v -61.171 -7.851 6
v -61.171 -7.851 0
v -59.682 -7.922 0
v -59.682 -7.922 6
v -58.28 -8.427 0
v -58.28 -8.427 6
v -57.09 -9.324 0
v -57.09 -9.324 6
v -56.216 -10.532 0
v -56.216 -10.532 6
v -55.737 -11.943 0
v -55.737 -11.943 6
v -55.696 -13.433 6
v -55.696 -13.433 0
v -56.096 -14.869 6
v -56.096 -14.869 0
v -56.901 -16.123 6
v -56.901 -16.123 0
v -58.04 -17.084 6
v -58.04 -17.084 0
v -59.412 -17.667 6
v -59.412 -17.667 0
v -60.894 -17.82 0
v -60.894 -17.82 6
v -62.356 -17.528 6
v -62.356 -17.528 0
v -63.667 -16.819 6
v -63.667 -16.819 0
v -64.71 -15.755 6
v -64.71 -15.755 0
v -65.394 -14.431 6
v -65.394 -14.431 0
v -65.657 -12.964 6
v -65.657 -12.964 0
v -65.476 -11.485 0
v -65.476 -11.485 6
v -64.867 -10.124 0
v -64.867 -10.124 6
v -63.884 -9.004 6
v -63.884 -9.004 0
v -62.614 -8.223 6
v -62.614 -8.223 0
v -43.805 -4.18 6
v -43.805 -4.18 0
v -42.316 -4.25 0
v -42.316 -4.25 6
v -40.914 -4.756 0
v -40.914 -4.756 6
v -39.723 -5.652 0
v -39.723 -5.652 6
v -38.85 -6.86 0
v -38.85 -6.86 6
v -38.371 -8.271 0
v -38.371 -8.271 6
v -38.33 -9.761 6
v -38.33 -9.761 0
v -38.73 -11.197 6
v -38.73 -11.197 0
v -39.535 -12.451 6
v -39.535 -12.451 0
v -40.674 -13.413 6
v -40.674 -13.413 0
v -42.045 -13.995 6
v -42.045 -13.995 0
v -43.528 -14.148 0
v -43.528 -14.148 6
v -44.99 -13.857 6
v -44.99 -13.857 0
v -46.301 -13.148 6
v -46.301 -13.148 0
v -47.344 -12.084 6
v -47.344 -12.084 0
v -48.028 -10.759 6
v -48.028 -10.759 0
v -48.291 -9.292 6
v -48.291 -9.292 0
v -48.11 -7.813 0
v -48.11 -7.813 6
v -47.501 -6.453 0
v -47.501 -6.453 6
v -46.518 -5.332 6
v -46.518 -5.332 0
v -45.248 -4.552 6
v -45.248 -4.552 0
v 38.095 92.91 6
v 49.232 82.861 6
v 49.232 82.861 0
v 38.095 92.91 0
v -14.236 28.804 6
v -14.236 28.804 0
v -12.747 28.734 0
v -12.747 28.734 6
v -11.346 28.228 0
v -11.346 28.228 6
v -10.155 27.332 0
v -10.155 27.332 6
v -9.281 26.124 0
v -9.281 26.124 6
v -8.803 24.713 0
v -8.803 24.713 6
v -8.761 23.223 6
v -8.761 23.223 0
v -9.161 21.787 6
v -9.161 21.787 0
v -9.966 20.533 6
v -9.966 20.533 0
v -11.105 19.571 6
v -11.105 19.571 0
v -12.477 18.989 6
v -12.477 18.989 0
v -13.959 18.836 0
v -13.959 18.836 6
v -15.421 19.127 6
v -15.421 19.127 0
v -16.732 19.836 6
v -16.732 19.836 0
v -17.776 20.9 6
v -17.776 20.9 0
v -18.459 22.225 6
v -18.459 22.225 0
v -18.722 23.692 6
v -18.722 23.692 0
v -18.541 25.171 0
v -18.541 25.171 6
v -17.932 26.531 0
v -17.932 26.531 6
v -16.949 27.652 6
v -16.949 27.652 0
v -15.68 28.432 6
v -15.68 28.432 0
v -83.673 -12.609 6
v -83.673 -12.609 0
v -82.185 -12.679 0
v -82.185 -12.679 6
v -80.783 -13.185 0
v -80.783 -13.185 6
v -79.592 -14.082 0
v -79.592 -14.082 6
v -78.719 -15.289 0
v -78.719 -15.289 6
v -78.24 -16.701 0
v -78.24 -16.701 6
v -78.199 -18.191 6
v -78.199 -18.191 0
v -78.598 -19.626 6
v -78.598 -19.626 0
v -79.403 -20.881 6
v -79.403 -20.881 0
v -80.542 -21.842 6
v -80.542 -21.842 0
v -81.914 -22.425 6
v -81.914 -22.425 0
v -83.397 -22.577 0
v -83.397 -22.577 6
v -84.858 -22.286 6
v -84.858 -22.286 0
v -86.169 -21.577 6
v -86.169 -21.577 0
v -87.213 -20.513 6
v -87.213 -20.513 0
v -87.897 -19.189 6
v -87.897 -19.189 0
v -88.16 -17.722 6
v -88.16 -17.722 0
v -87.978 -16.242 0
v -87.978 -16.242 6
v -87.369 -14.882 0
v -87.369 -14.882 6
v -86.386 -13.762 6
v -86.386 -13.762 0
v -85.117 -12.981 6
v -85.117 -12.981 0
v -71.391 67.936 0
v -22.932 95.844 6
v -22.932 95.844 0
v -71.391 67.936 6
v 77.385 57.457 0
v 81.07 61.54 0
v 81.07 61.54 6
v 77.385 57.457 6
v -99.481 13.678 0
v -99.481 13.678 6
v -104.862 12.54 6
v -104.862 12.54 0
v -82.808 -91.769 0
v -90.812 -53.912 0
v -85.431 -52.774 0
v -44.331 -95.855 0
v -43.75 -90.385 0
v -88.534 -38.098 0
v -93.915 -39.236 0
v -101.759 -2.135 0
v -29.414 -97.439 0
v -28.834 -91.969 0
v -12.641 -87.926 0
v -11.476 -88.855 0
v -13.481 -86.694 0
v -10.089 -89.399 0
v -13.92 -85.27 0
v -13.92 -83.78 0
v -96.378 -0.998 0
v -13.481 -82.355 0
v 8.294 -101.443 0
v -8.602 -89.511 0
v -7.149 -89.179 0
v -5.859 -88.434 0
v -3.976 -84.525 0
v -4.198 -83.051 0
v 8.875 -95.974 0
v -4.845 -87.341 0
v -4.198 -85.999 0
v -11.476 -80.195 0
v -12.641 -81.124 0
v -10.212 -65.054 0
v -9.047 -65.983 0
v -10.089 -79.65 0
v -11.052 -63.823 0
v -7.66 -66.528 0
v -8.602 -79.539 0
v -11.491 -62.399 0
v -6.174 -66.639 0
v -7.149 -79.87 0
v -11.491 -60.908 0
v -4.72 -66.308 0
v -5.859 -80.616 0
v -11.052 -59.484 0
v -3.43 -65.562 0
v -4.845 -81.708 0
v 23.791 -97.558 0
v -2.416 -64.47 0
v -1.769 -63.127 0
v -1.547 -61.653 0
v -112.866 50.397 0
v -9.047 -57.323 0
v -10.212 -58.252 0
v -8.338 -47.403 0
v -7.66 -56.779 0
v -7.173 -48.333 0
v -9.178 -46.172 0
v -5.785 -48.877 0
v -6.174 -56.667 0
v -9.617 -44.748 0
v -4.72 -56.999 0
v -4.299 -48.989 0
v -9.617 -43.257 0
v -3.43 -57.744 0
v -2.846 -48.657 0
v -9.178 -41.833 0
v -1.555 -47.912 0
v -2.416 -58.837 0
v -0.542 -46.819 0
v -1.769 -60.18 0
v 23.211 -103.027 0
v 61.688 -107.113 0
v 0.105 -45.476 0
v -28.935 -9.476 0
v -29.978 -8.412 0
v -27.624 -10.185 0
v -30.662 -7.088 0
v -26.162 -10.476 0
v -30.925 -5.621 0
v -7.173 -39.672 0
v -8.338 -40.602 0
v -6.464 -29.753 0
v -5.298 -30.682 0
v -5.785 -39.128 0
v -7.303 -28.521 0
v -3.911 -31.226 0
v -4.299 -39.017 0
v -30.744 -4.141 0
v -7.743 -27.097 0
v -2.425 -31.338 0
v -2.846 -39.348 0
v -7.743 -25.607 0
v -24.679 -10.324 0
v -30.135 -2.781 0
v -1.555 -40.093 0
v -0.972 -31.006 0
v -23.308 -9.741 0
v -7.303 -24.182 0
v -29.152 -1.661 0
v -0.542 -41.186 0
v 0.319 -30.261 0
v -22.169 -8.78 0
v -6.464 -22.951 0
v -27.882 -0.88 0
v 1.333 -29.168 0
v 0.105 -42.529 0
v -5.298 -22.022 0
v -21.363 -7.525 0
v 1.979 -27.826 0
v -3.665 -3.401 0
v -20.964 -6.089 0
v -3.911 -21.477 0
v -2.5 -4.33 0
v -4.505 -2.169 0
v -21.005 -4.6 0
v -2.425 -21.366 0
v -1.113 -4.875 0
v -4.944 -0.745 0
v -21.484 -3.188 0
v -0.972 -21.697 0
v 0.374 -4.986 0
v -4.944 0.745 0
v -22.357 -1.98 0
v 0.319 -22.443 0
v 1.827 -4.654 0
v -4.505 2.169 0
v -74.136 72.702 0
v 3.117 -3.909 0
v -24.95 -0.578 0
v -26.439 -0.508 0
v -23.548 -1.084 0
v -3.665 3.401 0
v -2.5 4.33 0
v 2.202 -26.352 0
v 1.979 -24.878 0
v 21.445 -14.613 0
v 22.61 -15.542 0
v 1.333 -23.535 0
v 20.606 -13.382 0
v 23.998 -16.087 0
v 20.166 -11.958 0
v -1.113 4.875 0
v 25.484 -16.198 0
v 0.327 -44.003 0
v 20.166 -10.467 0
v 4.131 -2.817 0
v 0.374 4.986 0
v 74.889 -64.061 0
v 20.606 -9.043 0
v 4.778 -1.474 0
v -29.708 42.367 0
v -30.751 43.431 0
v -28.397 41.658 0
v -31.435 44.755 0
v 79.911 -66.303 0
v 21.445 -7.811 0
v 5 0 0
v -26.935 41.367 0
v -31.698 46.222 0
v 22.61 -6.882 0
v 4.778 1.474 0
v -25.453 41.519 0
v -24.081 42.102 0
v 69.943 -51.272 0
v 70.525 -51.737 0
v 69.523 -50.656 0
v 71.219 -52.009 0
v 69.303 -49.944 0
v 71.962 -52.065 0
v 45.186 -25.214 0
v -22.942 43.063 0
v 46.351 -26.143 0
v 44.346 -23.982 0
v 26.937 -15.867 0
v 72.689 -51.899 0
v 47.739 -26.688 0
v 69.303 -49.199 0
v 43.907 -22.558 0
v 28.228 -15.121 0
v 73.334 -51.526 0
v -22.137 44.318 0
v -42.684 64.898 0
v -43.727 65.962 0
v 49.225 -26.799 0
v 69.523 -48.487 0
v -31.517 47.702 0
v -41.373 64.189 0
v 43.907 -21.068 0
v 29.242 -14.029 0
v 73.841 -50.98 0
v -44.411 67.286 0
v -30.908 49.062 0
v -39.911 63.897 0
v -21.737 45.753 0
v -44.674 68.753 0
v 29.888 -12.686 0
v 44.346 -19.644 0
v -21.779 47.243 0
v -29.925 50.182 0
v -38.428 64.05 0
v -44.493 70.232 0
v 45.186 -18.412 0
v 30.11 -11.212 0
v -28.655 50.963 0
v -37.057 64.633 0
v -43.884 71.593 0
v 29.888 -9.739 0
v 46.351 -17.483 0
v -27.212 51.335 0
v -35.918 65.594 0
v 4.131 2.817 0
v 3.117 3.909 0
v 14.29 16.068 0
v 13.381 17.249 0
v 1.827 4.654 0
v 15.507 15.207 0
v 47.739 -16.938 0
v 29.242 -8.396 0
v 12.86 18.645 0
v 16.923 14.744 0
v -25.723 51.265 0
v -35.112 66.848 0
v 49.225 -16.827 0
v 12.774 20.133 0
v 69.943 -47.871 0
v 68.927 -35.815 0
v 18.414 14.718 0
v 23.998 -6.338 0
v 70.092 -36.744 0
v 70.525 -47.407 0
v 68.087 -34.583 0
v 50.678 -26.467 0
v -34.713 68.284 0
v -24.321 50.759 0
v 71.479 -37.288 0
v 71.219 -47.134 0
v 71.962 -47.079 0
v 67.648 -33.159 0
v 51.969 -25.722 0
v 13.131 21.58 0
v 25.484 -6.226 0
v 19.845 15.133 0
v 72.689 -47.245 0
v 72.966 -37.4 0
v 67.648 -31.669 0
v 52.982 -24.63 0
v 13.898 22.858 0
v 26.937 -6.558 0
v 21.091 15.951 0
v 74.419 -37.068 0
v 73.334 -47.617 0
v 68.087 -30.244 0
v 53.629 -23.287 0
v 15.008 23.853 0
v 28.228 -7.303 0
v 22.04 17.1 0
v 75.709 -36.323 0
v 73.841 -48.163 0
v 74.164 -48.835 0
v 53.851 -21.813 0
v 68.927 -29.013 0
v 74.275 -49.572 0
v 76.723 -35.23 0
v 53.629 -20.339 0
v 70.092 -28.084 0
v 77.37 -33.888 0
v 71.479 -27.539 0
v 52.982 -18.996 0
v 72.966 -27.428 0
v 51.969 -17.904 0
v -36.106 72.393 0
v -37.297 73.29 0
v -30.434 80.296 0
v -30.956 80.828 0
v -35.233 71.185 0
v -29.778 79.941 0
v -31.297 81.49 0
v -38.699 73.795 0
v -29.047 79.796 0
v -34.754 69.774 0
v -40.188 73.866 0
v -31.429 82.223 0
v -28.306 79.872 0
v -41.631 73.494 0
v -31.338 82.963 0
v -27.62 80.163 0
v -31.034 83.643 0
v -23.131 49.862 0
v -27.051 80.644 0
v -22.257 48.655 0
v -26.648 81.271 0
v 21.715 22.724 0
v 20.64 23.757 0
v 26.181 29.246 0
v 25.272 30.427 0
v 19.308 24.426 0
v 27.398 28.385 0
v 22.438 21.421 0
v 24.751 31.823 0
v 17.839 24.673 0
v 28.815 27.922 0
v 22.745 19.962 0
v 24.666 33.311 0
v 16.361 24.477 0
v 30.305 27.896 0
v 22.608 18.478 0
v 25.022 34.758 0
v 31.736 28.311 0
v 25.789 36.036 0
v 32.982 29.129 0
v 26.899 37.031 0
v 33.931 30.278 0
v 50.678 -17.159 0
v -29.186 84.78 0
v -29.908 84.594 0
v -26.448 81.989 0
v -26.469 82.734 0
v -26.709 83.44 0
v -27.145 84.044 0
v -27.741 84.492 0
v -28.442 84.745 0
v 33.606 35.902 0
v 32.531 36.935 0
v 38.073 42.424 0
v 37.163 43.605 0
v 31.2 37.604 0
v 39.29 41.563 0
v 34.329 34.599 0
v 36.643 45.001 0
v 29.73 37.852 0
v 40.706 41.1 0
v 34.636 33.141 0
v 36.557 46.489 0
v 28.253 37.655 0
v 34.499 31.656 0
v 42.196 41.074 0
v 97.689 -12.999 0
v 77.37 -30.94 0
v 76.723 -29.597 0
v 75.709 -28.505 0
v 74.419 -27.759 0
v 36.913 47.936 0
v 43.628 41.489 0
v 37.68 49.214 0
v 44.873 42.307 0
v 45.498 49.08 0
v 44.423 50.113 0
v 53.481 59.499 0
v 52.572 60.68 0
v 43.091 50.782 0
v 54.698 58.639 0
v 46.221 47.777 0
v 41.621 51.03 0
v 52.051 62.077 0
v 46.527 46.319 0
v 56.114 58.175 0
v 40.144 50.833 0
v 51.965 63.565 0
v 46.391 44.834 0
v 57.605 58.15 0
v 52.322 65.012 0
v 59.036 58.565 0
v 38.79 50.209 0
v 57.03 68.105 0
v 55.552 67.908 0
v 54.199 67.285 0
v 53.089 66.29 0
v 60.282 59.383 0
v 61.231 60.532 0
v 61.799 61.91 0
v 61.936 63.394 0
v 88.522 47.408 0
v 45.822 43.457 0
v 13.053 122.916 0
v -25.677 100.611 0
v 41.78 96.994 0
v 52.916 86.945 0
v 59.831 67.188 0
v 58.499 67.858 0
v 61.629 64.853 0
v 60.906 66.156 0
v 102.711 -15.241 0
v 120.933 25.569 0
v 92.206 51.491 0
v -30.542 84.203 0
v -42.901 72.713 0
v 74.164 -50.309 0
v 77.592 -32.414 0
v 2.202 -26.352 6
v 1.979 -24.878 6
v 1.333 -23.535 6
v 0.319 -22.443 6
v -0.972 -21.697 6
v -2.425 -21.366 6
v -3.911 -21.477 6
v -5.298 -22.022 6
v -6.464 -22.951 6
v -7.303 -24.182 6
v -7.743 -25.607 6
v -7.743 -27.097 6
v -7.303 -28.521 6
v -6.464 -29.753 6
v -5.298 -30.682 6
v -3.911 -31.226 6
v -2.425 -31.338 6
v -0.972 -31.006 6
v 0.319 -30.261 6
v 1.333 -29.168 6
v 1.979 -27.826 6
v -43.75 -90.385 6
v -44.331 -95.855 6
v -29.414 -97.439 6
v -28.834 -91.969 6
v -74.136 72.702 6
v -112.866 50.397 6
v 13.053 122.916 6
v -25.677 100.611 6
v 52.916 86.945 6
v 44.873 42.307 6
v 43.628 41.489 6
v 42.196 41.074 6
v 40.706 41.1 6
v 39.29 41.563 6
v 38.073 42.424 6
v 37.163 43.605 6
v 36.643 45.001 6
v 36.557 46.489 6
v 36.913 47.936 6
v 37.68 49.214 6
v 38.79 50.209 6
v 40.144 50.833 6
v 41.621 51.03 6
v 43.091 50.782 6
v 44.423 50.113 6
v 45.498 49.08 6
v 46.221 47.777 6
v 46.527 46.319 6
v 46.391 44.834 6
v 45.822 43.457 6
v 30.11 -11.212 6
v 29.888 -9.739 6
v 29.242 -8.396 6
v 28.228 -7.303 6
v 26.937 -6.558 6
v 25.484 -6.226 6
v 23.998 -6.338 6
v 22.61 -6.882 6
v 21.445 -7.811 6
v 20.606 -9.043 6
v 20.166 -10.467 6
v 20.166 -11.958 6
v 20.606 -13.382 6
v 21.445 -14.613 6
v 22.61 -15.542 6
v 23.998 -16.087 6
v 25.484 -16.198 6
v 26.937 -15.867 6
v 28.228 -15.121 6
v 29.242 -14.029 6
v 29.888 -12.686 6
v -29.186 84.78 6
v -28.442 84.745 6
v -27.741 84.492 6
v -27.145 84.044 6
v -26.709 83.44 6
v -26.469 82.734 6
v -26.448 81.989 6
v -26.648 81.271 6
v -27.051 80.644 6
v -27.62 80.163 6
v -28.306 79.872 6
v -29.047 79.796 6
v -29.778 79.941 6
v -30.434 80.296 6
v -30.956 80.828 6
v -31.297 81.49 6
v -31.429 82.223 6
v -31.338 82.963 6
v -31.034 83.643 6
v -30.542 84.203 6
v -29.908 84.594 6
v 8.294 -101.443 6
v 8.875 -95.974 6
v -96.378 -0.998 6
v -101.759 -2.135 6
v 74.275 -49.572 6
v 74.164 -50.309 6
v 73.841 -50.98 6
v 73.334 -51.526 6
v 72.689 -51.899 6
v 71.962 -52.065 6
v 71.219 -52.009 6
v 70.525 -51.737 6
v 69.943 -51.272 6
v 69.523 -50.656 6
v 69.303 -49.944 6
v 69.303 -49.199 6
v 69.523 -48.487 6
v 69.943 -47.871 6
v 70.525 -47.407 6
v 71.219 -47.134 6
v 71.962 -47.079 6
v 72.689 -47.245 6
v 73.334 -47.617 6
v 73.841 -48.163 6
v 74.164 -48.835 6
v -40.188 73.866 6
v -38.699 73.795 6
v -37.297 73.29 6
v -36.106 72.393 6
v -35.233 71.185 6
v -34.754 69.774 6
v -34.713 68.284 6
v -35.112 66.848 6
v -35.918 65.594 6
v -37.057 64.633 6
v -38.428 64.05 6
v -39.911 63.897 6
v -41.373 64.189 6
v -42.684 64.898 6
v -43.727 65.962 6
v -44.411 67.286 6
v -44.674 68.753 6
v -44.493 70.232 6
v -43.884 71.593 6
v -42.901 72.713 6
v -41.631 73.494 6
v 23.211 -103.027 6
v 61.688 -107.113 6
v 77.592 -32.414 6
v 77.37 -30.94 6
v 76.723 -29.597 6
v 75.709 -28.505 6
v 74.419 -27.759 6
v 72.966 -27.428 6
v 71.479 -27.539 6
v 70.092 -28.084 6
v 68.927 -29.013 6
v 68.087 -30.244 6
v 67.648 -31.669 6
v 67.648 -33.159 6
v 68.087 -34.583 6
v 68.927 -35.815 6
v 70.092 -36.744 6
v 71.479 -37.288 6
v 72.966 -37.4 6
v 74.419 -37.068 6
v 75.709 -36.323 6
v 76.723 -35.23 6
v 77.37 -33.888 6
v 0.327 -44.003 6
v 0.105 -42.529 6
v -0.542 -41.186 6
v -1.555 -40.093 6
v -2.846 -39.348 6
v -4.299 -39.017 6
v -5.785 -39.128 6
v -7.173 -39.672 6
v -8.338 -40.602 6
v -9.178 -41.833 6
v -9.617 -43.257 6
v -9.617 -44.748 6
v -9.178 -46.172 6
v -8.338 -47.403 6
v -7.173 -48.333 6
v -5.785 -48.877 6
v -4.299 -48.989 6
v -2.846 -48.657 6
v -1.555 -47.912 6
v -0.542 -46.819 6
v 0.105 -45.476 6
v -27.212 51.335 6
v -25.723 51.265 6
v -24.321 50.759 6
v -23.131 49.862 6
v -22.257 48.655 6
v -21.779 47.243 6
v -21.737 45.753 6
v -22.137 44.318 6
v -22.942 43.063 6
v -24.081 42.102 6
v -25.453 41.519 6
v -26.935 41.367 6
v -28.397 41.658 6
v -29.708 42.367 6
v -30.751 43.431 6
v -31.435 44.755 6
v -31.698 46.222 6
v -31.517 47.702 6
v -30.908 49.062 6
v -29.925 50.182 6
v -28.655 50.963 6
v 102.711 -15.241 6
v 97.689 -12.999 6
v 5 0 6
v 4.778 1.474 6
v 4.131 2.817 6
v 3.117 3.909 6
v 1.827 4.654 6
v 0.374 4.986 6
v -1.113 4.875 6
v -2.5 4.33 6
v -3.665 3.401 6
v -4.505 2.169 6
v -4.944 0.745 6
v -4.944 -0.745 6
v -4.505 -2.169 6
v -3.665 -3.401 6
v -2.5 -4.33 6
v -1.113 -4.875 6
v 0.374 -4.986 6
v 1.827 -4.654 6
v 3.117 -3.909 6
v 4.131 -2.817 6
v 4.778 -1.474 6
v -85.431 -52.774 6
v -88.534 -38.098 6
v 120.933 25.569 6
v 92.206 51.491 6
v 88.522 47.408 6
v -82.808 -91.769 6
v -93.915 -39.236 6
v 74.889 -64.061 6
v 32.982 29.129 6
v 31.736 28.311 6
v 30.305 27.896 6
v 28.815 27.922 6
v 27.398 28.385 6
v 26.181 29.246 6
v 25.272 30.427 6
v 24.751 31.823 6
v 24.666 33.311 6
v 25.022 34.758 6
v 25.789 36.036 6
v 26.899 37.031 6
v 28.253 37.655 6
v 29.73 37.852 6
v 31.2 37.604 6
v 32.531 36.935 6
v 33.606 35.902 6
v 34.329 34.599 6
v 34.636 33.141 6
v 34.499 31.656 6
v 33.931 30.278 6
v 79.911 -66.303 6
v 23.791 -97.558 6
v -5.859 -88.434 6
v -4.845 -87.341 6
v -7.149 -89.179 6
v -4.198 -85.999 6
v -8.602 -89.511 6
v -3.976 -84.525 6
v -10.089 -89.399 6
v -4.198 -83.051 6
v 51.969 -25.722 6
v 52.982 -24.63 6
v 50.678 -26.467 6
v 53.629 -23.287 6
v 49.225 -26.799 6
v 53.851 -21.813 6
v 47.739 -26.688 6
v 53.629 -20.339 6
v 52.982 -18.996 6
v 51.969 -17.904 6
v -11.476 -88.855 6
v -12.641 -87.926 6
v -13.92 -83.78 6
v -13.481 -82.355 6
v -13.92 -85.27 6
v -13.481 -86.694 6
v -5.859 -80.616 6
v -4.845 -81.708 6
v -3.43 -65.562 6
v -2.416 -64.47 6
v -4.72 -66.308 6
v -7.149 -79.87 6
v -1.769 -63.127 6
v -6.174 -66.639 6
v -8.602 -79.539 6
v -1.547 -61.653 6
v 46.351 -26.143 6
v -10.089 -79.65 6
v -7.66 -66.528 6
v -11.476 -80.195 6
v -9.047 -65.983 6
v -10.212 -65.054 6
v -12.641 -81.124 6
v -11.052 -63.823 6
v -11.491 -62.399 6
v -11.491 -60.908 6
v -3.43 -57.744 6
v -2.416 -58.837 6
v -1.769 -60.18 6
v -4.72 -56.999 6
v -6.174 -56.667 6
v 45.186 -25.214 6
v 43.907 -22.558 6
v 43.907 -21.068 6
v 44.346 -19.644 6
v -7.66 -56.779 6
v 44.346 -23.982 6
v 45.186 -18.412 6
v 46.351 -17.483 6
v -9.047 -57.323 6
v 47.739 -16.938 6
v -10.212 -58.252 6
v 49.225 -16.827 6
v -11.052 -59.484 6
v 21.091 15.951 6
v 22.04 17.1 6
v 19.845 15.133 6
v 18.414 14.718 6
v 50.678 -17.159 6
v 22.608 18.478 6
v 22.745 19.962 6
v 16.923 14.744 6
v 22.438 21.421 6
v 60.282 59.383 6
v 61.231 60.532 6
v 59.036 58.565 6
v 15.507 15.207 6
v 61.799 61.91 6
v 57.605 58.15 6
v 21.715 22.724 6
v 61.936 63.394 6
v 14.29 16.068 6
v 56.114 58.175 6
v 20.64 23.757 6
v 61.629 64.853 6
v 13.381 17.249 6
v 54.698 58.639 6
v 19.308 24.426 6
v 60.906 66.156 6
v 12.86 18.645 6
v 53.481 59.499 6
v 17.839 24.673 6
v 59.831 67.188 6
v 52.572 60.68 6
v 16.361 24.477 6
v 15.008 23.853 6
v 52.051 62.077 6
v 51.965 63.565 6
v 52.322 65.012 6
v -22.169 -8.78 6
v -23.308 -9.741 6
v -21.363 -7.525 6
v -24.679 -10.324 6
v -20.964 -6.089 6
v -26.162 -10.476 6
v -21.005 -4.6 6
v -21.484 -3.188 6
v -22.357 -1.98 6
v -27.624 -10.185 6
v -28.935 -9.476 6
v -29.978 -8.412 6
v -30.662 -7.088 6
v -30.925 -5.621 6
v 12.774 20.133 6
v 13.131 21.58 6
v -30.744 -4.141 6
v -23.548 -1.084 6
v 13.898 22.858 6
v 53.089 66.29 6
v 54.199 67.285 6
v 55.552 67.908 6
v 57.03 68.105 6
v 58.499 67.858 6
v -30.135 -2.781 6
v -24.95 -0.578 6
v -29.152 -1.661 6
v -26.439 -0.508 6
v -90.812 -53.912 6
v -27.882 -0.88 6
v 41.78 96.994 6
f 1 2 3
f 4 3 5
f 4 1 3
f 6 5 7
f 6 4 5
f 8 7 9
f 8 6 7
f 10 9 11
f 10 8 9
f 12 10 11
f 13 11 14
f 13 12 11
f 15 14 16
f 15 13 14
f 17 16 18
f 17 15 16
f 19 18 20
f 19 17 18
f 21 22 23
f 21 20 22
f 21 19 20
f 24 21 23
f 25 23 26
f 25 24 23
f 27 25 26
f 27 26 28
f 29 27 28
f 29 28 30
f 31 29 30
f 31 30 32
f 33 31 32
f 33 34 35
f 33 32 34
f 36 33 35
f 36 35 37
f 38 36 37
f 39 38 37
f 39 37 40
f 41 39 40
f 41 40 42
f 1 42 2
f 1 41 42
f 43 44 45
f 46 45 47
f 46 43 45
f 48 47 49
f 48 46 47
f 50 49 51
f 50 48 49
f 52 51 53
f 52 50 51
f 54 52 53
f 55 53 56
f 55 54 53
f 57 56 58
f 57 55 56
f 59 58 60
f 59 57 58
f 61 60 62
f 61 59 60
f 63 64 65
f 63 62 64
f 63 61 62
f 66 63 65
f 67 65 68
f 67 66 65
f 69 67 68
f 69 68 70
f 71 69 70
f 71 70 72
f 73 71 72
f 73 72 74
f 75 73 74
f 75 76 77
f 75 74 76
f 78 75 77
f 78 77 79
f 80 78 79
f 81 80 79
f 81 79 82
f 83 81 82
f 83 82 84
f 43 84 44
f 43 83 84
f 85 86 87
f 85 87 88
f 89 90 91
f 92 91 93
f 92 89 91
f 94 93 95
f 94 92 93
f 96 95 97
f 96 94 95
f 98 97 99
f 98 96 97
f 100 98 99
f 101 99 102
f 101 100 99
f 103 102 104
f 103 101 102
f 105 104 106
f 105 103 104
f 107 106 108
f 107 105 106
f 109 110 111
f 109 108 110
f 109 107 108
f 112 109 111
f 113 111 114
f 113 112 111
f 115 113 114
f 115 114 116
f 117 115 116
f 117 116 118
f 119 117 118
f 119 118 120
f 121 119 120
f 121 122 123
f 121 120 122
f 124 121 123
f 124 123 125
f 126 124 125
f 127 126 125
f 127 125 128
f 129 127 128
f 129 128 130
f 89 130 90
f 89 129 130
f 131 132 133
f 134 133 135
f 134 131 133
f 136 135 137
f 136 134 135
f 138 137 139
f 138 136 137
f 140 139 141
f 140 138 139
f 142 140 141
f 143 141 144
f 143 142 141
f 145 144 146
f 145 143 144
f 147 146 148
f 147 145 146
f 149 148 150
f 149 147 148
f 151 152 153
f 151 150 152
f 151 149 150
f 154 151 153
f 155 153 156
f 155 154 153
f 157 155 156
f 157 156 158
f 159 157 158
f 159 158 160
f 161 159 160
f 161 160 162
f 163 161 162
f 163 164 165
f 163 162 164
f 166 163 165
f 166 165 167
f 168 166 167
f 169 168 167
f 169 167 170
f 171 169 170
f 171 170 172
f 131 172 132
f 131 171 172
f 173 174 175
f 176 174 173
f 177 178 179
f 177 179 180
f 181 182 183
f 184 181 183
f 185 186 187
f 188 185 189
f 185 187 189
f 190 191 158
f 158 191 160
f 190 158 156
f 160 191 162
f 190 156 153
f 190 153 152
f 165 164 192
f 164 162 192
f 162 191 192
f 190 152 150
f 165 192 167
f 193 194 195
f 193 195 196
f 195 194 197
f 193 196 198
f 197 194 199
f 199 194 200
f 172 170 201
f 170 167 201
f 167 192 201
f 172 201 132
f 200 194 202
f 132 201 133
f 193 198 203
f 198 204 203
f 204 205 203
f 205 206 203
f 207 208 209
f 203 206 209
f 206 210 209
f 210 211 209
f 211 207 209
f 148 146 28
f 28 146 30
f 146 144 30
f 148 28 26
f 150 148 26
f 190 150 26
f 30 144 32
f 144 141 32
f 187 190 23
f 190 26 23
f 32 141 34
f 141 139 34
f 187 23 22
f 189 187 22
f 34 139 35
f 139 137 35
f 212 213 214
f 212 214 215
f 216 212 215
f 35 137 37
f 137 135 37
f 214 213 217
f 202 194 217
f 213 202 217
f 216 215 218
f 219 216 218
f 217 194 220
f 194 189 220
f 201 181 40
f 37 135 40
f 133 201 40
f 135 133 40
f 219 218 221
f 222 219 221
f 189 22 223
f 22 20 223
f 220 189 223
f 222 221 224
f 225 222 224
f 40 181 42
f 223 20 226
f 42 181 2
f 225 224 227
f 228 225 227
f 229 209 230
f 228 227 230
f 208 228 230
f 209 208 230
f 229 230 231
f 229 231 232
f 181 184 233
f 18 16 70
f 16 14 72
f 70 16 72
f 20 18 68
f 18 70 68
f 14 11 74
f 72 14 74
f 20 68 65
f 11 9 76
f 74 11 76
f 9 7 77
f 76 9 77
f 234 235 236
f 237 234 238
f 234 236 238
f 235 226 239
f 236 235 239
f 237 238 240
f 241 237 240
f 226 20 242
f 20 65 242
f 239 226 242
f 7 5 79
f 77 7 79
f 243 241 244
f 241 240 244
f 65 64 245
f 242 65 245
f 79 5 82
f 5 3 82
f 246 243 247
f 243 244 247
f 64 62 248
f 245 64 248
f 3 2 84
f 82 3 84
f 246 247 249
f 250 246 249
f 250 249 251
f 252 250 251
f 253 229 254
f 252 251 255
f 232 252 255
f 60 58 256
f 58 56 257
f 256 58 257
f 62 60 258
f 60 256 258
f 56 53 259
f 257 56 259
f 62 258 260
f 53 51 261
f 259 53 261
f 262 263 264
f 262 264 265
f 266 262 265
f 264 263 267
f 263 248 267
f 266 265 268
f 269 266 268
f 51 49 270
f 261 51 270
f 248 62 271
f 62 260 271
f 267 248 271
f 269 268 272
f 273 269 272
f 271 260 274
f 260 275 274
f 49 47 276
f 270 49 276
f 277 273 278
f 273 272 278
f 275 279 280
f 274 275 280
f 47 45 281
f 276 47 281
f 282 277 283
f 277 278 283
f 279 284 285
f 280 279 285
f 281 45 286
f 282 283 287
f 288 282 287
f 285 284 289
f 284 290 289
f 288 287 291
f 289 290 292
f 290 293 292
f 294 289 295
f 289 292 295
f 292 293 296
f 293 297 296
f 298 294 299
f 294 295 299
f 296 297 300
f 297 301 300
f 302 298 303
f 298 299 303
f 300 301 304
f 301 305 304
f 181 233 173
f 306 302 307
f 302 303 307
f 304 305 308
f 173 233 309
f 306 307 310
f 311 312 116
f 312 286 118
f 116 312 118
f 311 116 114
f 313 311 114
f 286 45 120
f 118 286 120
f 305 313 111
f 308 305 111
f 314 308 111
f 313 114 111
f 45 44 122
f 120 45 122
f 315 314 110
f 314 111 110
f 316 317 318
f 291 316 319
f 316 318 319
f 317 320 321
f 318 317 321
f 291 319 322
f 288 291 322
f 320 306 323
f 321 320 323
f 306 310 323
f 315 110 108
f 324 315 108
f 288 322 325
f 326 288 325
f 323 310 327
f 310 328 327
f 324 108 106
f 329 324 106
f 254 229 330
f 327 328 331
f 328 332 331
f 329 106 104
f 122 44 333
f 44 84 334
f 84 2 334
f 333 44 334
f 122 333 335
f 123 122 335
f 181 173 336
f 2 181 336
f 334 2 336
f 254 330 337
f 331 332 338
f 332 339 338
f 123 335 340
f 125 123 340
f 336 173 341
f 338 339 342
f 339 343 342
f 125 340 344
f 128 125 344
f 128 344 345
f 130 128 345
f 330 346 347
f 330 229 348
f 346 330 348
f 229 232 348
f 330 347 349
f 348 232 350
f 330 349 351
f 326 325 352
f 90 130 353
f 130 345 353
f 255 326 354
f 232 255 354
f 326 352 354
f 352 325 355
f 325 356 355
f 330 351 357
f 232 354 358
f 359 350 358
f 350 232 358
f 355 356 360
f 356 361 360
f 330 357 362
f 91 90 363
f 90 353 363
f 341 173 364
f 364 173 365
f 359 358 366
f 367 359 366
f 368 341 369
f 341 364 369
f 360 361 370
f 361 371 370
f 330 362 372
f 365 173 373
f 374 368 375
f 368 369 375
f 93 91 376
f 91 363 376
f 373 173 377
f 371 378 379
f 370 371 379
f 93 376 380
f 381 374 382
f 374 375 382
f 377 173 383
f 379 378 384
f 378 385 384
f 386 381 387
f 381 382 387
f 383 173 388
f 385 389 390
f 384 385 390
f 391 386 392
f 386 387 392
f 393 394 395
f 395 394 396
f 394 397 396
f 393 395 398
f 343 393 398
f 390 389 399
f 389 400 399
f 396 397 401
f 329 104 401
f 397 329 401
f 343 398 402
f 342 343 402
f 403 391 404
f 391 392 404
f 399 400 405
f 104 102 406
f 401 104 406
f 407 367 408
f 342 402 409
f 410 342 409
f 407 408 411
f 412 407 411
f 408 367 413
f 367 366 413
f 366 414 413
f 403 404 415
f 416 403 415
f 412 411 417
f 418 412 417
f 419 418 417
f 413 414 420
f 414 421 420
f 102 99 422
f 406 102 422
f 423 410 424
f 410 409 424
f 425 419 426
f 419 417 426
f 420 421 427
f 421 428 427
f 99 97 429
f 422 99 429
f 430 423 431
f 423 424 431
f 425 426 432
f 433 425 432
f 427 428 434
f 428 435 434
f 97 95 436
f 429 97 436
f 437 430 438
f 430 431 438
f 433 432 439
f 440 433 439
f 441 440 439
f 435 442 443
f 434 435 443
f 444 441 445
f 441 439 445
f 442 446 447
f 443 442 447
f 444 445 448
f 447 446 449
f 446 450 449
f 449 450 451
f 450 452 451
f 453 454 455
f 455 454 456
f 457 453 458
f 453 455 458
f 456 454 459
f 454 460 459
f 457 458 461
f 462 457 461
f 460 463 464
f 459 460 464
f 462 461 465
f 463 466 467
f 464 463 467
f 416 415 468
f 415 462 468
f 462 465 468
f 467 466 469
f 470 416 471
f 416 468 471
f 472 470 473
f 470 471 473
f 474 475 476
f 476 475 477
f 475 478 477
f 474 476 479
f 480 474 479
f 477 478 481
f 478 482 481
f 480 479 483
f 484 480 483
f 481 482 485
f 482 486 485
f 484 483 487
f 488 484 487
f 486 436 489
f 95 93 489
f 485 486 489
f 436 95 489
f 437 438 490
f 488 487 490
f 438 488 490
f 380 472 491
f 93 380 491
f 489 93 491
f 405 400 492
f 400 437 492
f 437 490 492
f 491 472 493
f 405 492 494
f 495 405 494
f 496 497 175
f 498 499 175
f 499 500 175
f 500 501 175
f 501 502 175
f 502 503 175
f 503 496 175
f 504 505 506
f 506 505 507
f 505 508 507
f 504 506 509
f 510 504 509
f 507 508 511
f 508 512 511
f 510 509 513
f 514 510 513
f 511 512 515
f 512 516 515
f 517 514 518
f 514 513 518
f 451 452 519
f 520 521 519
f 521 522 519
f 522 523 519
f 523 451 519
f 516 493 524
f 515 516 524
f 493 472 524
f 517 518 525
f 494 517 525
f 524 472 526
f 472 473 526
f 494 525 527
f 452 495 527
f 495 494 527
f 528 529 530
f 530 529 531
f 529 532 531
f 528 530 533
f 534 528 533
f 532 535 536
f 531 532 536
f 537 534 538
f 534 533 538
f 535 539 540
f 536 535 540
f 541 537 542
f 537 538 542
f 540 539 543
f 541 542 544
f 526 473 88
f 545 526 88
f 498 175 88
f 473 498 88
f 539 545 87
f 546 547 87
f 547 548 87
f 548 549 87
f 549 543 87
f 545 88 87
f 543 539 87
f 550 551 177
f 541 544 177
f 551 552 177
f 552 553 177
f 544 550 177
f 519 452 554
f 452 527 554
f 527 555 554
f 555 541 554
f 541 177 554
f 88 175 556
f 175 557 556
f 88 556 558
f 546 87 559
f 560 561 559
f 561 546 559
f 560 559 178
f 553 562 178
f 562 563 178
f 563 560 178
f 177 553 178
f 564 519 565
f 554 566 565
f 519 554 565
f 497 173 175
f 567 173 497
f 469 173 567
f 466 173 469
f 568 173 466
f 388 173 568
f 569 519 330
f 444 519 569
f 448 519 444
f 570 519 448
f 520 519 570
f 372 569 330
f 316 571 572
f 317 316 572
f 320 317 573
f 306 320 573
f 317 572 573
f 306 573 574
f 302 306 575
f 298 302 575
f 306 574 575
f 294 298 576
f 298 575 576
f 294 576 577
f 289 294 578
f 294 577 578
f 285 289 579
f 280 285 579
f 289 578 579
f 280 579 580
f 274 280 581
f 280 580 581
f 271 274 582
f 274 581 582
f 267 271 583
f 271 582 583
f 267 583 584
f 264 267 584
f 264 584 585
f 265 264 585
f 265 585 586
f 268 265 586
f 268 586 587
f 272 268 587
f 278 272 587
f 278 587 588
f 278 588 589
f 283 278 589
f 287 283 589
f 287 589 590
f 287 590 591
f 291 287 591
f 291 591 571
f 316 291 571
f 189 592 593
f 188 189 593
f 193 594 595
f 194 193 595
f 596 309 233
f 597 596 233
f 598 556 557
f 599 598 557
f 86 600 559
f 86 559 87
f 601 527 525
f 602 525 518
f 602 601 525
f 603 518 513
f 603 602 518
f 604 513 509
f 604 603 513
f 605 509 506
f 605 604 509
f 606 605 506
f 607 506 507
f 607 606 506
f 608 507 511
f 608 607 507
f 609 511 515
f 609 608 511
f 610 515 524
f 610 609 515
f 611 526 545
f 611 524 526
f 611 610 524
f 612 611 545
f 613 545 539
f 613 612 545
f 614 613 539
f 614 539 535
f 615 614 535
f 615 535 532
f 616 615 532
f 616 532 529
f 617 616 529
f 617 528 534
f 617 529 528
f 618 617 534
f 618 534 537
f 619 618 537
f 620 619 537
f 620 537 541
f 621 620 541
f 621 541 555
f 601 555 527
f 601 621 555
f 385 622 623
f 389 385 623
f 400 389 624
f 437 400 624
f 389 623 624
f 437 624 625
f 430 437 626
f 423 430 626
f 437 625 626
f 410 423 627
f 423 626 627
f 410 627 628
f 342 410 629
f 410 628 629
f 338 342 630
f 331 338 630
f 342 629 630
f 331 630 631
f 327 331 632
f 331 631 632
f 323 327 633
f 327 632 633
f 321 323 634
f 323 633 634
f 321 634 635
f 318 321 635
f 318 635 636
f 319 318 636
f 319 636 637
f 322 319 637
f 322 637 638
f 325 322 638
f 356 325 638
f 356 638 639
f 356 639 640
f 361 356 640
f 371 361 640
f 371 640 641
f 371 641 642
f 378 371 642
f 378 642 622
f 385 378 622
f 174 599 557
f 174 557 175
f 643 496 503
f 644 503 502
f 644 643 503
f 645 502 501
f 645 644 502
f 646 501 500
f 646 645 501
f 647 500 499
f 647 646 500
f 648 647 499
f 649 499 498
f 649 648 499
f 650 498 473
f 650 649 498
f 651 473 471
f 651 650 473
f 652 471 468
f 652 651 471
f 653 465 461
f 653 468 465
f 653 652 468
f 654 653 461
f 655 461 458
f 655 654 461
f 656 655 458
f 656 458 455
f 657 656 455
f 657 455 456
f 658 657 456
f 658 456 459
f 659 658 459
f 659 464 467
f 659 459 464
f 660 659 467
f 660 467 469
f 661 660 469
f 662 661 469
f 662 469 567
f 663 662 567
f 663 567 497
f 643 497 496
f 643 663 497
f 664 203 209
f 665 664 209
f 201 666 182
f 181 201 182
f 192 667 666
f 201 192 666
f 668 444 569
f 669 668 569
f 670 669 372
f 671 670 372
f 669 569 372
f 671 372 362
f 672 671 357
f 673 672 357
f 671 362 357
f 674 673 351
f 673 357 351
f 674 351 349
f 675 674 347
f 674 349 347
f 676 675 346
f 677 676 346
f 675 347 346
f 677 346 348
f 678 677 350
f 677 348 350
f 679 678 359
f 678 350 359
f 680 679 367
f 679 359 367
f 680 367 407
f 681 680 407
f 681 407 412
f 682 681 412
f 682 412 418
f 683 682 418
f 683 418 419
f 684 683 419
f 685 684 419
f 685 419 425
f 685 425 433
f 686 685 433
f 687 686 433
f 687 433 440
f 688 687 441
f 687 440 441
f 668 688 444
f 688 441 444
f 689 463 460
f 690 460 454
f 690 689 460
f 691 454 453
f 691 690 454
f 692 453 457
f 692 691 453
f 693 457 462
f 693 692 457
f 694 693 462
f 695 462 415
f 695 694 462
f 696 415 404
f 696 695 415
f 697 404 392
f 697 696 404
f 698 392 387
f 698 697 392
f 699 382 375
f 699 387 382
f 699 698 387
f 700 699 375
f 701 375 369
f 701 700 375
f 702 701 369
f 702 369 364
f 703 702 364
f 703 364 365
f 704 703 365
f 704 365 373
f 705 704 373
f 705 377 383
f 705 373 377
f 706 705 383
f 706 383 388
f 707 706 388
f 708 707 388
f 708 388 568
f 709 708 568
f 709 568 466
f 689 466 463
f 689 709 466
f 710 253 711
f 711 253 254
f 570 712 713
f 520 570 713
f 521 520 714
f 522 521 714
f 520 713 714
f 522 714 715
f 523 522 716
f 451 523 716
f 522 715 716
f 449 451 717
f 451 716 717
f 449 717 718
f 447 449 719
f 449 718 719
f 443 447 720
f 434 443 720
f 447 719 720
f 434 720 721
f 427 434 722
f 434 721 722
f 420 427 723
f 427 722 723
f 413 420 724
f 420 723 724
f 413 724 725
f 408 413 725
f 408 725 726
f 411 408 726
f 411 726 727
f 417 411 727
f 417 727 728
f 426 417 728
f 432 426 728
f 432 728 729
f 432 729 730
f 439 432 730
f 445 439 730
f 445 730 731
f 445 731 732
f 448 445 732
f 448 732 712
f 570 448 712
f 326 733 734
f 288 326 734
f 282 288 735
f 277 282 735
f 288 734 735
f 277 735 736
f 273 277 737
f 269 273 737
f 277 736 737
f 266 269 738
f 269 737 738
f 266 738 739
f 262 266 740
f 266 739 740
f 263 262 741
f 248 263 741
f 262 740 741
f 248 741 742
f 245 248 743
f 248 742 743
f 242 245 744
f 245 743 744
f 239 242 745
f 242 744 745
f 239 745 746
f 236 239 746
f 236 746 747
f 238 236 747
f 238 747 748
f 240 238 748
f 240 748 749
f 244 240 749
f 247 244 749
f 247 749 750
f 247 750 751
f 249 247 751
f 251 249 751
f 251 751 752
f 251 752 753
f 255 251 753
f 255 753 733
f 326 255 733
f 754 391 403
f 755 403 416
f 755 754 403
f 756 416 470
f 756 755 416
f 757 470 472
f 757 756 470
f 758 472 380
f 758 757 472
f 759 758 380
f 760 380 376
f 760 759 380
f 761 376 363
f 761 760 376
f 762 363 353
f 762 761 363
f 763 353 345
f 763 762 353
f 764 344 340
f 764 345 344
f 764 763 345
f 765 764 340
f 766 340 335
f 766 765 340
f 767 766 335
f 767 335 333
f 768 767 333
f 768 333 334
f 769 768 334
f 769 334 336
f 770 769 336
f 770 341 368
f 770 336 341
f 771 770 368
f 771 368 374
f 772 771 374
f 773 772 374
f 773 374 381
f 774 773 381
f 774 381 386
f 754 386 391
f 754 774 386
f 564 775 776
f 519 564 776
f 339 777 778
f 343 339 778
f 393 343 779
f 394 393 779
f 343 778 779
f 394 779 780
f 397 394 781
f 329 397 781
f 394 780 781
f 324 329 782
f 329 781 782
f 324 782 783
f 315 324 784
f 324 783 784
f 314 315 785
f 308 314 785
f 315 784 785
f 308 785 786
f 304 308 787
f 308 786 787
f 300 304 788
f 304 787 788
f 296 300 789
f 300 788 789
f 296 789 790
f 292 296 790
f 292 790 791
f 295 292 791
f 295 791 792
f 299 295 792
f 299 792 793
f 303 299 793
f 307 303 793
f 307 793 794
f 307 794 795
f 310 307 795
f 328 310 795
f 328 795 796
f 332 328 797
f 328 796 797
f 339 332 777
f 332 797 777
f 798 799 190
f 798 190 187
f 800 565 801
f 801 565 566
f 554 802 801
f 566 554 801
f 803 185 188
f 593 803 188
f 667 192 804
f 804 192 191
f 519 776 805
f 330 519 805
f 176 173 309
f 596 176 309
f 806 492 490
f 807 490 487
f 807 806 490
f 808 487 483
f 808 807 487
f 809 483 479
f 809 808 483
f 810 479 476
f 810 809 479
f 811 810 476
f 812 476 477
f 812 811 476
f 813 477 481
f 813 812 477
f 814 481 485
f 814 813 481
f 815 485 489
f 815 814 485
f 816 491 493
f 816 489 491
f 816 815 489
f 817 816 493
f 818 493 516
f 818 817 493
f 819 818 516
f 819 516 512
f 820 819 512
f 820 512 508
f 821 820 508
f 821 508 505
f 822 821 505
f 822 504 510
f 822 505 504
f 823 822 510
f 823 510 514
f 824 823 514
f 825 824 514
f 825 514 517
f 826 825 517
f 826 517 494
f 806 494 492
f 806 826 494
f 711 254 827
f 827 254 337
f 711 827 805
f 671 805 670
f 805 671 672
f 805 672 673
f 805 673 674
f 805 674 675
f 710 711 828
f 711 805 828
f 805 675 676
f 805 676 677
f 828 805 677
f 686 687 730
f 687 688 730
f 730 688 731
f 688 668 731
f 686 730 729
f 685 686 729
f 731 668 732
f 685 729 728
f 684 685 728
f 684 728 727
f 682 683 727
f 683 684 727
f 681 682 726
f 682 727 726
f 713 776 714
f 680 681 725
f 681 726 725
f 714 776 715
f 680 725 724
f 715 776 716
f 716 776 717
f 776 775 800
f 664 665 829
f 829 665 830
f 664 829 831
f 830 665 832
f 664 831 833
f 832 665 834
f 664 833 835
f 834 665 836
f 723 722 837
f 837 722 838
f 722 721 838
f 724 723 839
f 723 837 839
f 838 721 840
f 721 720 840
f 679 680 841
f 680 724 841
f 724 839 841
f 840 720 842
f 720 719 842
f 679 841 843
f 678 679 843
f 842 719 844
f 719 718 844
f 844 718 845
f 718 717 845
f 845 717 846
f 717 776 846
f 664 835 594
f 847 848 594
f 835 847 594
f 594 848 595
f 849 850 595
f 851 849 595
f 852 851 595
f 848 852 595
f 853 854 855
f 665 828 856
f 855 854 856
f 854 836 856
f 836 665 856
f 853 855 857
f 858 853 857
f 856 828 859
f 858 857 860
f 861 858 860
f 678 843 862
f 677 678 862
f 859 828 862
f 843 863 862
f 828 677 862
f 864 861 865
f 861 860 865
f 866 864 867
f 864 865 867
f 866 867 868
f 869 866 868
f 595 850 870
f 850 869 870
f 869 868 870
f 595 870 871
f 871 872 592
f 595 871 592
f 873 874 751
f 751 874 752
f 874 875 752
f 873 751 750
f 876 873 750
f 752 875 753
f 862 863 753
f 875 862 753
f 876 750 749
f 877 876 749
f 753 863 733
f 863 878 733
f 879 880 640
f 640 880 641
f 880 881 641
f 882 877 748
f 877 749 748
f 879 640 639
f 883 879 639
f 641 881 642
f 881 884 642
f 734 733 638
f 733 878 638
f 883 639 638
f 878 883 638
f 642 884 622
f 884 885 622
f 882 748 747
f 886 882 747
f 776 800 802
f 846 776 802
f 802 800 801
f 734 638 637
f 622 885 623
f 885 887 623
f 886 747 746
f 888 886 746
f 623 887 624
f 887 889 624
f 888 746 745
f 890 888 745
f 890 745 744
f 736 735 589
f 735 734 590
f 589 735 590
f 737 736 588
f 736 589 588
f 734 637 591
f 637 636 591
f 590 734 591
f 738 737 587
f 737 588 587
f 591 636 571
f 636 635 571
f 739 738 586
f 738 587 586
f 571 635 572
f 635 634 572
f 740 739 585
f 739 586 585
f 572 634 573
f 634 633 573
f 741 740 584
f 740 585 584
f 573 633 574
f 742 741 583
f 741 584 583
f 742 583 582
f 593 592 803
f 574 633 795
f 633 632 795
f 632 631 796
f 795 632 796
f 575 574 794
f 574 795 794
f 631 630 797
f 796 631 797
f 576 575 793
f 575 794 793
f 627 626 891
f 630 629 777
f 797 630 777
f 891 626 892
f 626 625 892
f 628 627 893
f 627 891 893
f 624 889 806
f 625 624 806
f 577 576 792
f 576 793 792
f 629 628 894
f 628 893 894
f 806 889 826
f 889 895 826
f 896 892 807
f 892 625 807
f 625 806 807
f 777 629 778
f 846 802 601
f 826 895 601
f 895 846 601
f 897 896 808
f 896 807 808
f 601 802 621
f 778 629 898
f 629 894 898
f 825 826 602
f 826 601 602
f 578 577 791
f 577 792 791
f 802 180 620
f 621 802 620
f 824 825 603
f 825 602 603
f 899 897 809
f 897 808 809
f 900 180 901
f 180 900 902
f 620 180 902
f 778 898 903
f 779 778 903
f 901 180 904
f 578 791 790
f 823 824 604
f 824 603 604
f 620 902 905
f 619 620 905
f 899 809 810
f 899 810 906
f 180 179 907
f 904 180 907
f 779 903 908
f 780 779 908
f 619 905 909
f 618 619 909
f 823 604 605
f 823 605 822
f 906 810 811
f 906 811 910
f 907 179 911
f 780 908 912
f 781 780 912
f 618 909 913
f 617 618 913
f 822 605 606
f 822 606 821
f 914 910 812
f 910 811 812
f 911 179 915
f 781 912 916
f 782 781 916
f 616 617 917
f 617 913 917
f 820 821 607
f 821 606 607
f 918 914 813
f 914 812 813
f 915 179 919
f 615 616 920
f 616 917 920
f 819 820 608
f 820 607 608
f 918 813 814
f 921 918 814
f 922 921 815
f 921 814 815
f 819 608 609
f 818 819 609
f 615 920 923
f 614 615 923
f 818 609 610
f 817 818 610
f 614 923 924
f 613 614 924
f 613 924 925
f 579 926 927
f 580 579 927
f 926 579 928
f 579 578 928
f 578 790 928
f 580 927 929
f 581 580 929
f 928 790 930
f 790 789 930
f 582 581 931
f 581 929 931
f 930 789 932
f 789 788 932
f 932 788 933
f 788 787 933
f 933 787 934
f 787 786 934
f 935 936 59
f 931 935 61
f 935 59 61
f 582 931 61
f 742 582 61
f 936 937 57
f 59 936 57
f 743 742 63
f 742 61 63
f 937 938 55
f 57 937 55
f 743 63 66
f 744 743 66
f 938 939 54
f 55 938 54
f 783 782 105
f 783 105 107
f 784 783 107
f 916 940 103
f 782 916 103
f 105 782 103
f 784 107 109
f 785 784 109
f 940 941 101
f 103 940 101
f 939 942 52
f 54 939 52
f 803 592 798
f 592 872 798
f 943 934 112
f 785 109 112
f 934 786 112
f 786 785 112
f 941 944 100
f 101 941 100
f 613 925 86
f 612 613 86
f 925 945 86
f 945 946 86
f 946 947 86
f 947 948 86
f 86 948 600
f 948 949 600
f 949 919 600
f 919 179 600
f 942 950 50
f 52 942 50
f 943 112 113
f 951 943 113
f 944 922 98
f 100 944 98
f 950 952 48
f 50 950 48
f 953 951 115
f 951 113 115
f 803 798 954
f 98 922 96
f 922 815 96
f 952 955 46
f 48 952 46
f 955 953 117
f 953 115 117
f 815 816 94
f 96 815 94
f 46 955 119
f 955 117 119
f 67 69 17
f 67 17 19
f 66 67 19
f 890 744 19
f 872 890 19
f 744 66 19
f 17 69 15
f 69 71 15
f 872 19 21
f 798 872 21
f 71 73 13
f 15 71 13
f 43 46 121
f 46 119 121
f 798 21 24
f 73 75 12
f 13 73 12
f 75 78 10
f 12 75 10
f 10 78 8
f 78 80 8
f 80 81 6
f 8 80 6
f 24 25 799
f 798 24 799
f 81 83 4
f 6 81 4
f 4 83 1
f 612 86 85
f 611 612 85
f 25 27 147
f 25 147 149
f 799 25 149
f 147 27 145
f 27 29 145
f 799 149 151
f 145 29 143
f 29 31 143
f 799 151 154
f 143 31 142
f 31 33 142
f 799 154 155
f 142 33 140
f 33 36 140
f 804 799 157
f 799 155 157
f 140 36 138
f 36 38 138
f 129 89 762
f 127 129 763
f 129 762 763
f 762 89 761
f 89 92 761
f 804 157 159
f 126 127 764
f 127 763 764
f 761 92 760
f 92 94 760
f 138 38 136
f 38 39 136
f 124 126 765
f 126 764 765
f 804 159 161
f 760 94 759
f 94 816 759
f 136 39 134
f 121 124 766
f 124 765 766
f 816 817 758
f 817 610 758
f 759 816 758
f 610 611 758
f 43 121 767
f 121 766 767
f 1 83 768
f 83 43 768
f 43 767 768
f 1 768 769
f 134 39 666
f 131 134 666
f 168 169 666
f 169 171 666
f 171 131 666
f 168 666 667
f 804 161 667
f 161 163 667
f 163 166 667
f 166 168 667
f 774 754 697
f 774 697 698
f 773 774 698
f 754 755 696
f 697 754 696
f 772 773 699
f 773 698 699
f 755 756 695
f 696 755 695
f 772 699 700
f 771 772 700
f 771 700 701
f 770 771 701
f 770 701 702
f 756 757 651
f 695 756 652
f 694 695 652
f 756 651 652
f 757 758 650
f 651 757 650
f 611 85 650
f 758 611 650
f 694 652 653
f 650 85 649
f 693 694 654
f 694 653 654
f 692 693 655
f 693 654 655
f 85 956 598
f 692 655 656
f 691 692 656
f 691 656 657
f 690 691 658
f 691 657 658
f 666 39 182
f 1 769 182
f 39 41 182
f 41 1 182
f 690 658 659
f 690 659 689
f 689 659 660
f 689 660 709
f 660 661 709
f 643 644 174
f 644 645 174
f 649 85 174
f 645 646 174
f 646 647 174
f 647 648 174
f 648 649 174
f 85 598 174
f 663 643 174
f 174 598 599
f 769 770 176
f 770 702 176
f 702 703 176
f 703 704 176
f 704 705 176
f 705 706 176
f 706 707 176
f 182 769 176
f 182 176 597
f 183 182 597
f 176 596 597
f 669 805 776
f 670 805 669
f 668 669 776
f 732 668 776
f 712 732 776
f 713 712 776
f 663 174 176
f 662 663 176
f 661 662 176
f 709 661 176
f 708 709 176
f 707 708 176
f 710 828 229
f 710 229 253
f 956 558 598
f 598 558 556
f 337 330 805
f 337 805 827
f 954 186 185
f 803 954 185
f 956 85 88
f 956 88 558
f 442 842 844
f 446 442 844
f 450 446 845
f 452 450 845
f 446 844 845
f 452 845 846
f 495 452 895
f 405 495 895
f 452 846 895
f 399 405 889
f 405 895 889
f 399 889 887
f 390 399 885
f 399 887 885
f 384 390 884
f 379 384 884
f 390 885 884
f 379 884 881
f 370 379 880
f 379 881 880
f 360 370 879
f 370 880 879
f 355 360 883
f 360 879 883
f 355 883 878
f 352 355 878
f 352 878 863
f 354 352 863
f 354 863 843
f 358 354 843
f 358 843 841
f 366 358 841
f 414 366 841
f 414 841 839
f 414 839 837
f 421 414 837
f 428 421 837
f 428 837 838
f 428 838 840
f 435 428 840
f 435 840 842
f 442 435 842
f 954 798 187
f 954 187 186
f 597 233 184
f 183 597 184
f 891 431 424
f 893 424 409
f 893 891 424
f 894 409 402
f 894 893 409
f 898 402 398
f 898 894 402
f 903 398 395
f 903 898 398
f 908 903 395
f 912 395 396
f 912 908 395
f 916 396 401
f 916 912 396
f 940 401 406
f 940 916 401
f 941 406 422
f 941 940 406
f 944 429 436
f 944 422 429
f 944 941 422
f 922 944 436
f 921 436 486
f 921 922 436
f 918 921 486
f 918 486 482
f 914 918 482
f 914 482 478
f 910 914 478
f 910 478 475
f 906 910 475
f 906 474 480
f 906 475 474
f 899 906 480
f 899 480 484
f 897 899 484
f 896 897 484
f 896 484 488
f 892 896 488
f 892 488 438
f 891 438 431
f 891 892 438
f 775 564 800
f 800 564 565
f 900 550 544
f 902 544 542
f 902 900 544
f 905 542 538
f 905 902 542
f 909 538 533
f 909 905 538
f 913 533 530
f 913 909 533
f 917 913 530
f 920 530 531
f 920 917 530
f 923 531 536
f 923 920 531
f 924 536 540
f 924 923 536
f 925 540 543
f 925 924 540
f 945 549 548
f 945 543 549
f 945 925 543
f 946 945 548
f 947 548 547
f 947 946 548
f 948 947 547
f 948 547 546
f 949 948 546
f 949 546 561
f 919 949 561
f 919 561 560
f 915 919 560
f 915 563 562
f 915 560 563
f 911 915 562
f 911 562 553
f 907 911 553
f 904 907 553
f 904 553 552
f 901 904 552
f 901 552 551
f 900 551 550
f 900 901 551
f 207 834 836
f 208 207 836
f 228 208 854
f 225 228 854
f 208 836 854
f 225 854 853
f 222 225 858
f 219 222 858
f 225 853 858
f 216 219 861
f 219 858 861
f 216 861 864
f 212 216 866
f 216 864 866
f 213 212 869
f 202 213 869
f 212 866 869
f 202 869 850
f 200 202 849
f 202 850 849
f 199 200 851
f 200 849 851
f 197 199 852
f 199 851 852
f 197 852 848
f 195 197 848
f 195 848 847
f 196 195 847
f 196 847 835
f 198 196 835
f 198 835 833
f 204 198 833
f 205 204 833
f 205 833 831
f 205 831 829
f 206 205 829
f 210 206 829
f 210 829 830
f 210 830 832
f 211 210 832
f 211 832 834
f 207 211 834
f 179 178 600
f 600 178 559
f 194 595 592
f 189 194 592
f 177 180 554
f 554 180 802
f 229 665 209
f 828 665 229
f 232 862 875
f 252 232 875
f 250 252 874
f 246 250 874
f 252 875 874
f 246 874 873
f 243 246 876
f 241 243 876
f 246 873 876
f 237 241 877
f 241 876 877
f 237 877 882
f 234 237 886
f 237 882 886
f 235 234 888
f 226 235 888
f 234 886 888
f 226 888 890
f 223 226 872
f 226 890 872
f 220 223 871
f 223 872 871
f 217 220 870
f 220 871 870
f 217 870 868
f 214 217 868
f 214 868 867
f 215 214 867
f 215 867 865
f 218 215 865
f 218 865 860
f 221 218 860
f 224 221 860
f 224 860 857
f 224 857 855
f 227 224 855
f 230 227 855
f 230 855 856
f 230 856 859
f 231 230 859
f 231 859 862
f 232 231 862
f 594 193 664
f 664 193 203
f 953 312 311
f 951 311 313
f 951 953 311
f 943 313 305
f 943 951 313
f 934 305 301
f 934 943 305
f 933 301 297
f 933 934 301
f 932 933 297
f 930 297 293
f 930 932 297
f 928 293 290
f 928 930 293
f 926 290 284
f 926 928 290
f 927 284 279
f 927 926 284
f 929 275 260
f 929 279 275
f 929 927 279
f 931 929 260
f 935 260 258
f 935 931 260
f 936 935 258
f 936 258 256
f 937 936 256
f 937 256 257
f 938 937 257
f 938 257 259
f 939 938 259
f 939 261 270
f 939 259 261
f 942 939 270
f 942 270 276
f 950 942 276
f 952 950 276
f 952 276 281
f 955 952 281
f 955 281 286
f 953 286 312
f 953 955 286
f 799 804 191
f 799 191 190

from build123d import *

# Parameters (mm, degrees)
BOSS_EXTRUDE1_DEPTH = 6
SKETCH2_R           = 5
CUT_EXTRUDE1_DEPTH  = 6
SKETCH11_R          = 4.999999998
CUT_EXTRUDE2_DEPTH  = 10
SKETCH12_R          = 5
SKETCH12_R_2        = 2.5
CUT_EXTRUDE3_DEPTH  = 10
CUT_EXTRUDE4_DEPTH  = 10
CUT_EXTRUDE5_DEPTH  = 10
BOSS_EXTRUDE2_START = -6
SKETCH14_R          = 2.5
BOSS_EXTRUDE2_DEPTH = 6
SKETCH14_3_R        = 2.5
CUT_EXTRUDE6_DEPTH  = 6


with BuildPart() as part:
    # Sketch1 → Boss-Extrude1 (new body)
    with BuildSketch(Plane.XY):
        Polygon((-82.808015356, -91.768584182), (61.688025962, -107.113154668), (120.9333121, 25.569013955), (13.052871288, 122.915674351), (-112.866193993, 50.397050544), align=None)
    extrude(amount=BOSS_EXTRUDE1_DEPTH)

    # Sketch2 → Cut-Extrude1 (cut)
    with BuildSketch(Plane.XY.offset(6)):
        Circle(SKETCH2_R)
    extrude(amount=-CUT_EXTRUDE1_DEPTH, mode=Mode.SUBTRACT)

    # Sketch11 → Cut-Extrude2 (cut)
    with BuildSketch(Plane.XY.offset(6)):
        with Locations((-6.54719671, -61.653339044)):
            Circle(SKETCH11_R)
        with Locations((-4.672797652, -44.002584721)):
            Circle(SKETCH11_R)
        with Locations((-2.798398593, -26.351830398)):
            Circle(SKETCH11_R)
        with Locations((-8.975995491, -84.524739011)):
            Circle(SKETCH11_R)
    cut_extrude2 = extrude(amount=-CUT_EXTRUDE2_DEPTH, mode=Mode.SUBTRACT)

    # Sketch12 → Cut-Extrude3 (cut)
    with BuildSketch(Plane.XY.offset(6)):
        with Locations((48.851207931, -21.813057641)):
            Circle(SKETCH12_R)
        with Locations((25.110433983, -11.212319348)):
            Circle(SKETCH12_R)
        with Locations((84.822429951, -20.352343286)):
            Circle(SKETCH12_R_2)
        with Locations((72.591981879, -32.413795933)):
            Circle(SKETCH12_R)
    cut_extrude3 = extrude(amount=-CUT_EXTRUDE3_DEPTH, mode=Mode.SUBTRACT)

    # Sketch11<3> → Cut-Extrude4 (cut)
    with BuildSketch(Plane.XY.offset(6)):
        Polygon((8.29449613, -101.443097727), (8.875295839, -95.973849909), (23.791426251, -97.557849113), (23.210626543, -103.027096932), align=None)
        Polygon((-29.414485521, -97.438641123), (-28.833685813, -91.969393305), (-43.749816225, -90.3853941), (-44.330615934, -95.854641919), align=None)
    cut_extrude4 = extrude(amount=-CUT_EXTRUDE4_DEPTH, mode=Mode.SUBTRACT)

    # Mirror3: Cut-Extrude2 across plane
    add(cut_extrude2.mirror(Plane(origin=(0, 0, 0), x_dir=(0, 0, 1), z_dir=(-0.4077207035645653, -0.9131066903077734, 0))), mode=Mode.SUBTRACT)

    # Mirror4: Cut-Extrude3 across plane
    add(cut_extrude3.mirror(Plane(origin=(0, 0, 0), x_dir=(0, 0, 1), z_dir=(0.742423441529948, -0.6699309169360882, 0))), mode=Mode.SUBTRACT)

    # Mirror5: Cut-Extrude2 across plane
    add(cut_extrude2.mirror(Plane(origin=(0, 0, 0), x_dir=(0, 0, 1), z_dir=(0.742423441529948, -0.6699309169360882, 0))), mode=Mode.SUBTRACT)

    # Mirror6: Cut-Extrude4 across plane
    add(cut_extrude4.mirror(Plane(origin=(0, 0, 0), x_dir=(0, 0, 1), z_dir=(-0.4077207035645653, -0.9131066903077734, 0))), mode=Mode.SUBTRACT)

    # Mirror7: Cut-Extrude4 across plane
    add(cut_extrude4.mirror(Plane(origin=(0, 0, 0), x_dir=(0, 0, 1), z_dir=(0.742423441529948, -0.6699309169360882, 0))), mode=Mode.SUBTRACT)

    # Sketch13 → Cut-Extrude5 (cut)
    with BuildSketch(Plane.XY.offset(6)):
        Polygon((79.910592339, -66.30299436), (102.710745723, -15.241146353), (97.688658926, -12.998682483), (74.888505542, -64.060530491), align=None)
    cut_extrude5 = extrude(amount=-CUT_EXTRUDE5_DEPTH, mode=Mode.SUBTRACT)

    # Mirror8: Cut-Extrude5 across plane
    add(cut_extrude5.mirror(Plane(origin=(0, 0, 0), x_dir=(0, 0, 1), z_dir=(0.742423441529948, -0.6699309169360882, 0))), mode=Mode.SUBTRACT)

    # Sketch14 → Boss-Extrude2 (add)
    with BuildSketch(Plane(origin=(0, 0, 0), x_dir=(-1, 0, 0), z_dir=(0, 0, -1)).offset(BOSS_EXTRUDE2_START)):
        with Locations((-84.822429951, -20.352343286)):
            Circle(SKETCH14_R)
    extrude(amount=BOSS_EXTRUDE2_DEPTH)

    # Sketch14<3> → Cut-Extrude6 (cut)
    with BuildSketch(Plane(origin=(0, 0, 0), x_dir=(-1, 0, 0), z_dir=(0, 0, -1))):
        with Locations((-71.775367437, -49.571757376)):
            Circle(SKETCH14_3_R)
    extrude(amount=-CUT_EXTRUDE6_DEPTH, mode=Mode.SUBTRACT)


solid = part.part
